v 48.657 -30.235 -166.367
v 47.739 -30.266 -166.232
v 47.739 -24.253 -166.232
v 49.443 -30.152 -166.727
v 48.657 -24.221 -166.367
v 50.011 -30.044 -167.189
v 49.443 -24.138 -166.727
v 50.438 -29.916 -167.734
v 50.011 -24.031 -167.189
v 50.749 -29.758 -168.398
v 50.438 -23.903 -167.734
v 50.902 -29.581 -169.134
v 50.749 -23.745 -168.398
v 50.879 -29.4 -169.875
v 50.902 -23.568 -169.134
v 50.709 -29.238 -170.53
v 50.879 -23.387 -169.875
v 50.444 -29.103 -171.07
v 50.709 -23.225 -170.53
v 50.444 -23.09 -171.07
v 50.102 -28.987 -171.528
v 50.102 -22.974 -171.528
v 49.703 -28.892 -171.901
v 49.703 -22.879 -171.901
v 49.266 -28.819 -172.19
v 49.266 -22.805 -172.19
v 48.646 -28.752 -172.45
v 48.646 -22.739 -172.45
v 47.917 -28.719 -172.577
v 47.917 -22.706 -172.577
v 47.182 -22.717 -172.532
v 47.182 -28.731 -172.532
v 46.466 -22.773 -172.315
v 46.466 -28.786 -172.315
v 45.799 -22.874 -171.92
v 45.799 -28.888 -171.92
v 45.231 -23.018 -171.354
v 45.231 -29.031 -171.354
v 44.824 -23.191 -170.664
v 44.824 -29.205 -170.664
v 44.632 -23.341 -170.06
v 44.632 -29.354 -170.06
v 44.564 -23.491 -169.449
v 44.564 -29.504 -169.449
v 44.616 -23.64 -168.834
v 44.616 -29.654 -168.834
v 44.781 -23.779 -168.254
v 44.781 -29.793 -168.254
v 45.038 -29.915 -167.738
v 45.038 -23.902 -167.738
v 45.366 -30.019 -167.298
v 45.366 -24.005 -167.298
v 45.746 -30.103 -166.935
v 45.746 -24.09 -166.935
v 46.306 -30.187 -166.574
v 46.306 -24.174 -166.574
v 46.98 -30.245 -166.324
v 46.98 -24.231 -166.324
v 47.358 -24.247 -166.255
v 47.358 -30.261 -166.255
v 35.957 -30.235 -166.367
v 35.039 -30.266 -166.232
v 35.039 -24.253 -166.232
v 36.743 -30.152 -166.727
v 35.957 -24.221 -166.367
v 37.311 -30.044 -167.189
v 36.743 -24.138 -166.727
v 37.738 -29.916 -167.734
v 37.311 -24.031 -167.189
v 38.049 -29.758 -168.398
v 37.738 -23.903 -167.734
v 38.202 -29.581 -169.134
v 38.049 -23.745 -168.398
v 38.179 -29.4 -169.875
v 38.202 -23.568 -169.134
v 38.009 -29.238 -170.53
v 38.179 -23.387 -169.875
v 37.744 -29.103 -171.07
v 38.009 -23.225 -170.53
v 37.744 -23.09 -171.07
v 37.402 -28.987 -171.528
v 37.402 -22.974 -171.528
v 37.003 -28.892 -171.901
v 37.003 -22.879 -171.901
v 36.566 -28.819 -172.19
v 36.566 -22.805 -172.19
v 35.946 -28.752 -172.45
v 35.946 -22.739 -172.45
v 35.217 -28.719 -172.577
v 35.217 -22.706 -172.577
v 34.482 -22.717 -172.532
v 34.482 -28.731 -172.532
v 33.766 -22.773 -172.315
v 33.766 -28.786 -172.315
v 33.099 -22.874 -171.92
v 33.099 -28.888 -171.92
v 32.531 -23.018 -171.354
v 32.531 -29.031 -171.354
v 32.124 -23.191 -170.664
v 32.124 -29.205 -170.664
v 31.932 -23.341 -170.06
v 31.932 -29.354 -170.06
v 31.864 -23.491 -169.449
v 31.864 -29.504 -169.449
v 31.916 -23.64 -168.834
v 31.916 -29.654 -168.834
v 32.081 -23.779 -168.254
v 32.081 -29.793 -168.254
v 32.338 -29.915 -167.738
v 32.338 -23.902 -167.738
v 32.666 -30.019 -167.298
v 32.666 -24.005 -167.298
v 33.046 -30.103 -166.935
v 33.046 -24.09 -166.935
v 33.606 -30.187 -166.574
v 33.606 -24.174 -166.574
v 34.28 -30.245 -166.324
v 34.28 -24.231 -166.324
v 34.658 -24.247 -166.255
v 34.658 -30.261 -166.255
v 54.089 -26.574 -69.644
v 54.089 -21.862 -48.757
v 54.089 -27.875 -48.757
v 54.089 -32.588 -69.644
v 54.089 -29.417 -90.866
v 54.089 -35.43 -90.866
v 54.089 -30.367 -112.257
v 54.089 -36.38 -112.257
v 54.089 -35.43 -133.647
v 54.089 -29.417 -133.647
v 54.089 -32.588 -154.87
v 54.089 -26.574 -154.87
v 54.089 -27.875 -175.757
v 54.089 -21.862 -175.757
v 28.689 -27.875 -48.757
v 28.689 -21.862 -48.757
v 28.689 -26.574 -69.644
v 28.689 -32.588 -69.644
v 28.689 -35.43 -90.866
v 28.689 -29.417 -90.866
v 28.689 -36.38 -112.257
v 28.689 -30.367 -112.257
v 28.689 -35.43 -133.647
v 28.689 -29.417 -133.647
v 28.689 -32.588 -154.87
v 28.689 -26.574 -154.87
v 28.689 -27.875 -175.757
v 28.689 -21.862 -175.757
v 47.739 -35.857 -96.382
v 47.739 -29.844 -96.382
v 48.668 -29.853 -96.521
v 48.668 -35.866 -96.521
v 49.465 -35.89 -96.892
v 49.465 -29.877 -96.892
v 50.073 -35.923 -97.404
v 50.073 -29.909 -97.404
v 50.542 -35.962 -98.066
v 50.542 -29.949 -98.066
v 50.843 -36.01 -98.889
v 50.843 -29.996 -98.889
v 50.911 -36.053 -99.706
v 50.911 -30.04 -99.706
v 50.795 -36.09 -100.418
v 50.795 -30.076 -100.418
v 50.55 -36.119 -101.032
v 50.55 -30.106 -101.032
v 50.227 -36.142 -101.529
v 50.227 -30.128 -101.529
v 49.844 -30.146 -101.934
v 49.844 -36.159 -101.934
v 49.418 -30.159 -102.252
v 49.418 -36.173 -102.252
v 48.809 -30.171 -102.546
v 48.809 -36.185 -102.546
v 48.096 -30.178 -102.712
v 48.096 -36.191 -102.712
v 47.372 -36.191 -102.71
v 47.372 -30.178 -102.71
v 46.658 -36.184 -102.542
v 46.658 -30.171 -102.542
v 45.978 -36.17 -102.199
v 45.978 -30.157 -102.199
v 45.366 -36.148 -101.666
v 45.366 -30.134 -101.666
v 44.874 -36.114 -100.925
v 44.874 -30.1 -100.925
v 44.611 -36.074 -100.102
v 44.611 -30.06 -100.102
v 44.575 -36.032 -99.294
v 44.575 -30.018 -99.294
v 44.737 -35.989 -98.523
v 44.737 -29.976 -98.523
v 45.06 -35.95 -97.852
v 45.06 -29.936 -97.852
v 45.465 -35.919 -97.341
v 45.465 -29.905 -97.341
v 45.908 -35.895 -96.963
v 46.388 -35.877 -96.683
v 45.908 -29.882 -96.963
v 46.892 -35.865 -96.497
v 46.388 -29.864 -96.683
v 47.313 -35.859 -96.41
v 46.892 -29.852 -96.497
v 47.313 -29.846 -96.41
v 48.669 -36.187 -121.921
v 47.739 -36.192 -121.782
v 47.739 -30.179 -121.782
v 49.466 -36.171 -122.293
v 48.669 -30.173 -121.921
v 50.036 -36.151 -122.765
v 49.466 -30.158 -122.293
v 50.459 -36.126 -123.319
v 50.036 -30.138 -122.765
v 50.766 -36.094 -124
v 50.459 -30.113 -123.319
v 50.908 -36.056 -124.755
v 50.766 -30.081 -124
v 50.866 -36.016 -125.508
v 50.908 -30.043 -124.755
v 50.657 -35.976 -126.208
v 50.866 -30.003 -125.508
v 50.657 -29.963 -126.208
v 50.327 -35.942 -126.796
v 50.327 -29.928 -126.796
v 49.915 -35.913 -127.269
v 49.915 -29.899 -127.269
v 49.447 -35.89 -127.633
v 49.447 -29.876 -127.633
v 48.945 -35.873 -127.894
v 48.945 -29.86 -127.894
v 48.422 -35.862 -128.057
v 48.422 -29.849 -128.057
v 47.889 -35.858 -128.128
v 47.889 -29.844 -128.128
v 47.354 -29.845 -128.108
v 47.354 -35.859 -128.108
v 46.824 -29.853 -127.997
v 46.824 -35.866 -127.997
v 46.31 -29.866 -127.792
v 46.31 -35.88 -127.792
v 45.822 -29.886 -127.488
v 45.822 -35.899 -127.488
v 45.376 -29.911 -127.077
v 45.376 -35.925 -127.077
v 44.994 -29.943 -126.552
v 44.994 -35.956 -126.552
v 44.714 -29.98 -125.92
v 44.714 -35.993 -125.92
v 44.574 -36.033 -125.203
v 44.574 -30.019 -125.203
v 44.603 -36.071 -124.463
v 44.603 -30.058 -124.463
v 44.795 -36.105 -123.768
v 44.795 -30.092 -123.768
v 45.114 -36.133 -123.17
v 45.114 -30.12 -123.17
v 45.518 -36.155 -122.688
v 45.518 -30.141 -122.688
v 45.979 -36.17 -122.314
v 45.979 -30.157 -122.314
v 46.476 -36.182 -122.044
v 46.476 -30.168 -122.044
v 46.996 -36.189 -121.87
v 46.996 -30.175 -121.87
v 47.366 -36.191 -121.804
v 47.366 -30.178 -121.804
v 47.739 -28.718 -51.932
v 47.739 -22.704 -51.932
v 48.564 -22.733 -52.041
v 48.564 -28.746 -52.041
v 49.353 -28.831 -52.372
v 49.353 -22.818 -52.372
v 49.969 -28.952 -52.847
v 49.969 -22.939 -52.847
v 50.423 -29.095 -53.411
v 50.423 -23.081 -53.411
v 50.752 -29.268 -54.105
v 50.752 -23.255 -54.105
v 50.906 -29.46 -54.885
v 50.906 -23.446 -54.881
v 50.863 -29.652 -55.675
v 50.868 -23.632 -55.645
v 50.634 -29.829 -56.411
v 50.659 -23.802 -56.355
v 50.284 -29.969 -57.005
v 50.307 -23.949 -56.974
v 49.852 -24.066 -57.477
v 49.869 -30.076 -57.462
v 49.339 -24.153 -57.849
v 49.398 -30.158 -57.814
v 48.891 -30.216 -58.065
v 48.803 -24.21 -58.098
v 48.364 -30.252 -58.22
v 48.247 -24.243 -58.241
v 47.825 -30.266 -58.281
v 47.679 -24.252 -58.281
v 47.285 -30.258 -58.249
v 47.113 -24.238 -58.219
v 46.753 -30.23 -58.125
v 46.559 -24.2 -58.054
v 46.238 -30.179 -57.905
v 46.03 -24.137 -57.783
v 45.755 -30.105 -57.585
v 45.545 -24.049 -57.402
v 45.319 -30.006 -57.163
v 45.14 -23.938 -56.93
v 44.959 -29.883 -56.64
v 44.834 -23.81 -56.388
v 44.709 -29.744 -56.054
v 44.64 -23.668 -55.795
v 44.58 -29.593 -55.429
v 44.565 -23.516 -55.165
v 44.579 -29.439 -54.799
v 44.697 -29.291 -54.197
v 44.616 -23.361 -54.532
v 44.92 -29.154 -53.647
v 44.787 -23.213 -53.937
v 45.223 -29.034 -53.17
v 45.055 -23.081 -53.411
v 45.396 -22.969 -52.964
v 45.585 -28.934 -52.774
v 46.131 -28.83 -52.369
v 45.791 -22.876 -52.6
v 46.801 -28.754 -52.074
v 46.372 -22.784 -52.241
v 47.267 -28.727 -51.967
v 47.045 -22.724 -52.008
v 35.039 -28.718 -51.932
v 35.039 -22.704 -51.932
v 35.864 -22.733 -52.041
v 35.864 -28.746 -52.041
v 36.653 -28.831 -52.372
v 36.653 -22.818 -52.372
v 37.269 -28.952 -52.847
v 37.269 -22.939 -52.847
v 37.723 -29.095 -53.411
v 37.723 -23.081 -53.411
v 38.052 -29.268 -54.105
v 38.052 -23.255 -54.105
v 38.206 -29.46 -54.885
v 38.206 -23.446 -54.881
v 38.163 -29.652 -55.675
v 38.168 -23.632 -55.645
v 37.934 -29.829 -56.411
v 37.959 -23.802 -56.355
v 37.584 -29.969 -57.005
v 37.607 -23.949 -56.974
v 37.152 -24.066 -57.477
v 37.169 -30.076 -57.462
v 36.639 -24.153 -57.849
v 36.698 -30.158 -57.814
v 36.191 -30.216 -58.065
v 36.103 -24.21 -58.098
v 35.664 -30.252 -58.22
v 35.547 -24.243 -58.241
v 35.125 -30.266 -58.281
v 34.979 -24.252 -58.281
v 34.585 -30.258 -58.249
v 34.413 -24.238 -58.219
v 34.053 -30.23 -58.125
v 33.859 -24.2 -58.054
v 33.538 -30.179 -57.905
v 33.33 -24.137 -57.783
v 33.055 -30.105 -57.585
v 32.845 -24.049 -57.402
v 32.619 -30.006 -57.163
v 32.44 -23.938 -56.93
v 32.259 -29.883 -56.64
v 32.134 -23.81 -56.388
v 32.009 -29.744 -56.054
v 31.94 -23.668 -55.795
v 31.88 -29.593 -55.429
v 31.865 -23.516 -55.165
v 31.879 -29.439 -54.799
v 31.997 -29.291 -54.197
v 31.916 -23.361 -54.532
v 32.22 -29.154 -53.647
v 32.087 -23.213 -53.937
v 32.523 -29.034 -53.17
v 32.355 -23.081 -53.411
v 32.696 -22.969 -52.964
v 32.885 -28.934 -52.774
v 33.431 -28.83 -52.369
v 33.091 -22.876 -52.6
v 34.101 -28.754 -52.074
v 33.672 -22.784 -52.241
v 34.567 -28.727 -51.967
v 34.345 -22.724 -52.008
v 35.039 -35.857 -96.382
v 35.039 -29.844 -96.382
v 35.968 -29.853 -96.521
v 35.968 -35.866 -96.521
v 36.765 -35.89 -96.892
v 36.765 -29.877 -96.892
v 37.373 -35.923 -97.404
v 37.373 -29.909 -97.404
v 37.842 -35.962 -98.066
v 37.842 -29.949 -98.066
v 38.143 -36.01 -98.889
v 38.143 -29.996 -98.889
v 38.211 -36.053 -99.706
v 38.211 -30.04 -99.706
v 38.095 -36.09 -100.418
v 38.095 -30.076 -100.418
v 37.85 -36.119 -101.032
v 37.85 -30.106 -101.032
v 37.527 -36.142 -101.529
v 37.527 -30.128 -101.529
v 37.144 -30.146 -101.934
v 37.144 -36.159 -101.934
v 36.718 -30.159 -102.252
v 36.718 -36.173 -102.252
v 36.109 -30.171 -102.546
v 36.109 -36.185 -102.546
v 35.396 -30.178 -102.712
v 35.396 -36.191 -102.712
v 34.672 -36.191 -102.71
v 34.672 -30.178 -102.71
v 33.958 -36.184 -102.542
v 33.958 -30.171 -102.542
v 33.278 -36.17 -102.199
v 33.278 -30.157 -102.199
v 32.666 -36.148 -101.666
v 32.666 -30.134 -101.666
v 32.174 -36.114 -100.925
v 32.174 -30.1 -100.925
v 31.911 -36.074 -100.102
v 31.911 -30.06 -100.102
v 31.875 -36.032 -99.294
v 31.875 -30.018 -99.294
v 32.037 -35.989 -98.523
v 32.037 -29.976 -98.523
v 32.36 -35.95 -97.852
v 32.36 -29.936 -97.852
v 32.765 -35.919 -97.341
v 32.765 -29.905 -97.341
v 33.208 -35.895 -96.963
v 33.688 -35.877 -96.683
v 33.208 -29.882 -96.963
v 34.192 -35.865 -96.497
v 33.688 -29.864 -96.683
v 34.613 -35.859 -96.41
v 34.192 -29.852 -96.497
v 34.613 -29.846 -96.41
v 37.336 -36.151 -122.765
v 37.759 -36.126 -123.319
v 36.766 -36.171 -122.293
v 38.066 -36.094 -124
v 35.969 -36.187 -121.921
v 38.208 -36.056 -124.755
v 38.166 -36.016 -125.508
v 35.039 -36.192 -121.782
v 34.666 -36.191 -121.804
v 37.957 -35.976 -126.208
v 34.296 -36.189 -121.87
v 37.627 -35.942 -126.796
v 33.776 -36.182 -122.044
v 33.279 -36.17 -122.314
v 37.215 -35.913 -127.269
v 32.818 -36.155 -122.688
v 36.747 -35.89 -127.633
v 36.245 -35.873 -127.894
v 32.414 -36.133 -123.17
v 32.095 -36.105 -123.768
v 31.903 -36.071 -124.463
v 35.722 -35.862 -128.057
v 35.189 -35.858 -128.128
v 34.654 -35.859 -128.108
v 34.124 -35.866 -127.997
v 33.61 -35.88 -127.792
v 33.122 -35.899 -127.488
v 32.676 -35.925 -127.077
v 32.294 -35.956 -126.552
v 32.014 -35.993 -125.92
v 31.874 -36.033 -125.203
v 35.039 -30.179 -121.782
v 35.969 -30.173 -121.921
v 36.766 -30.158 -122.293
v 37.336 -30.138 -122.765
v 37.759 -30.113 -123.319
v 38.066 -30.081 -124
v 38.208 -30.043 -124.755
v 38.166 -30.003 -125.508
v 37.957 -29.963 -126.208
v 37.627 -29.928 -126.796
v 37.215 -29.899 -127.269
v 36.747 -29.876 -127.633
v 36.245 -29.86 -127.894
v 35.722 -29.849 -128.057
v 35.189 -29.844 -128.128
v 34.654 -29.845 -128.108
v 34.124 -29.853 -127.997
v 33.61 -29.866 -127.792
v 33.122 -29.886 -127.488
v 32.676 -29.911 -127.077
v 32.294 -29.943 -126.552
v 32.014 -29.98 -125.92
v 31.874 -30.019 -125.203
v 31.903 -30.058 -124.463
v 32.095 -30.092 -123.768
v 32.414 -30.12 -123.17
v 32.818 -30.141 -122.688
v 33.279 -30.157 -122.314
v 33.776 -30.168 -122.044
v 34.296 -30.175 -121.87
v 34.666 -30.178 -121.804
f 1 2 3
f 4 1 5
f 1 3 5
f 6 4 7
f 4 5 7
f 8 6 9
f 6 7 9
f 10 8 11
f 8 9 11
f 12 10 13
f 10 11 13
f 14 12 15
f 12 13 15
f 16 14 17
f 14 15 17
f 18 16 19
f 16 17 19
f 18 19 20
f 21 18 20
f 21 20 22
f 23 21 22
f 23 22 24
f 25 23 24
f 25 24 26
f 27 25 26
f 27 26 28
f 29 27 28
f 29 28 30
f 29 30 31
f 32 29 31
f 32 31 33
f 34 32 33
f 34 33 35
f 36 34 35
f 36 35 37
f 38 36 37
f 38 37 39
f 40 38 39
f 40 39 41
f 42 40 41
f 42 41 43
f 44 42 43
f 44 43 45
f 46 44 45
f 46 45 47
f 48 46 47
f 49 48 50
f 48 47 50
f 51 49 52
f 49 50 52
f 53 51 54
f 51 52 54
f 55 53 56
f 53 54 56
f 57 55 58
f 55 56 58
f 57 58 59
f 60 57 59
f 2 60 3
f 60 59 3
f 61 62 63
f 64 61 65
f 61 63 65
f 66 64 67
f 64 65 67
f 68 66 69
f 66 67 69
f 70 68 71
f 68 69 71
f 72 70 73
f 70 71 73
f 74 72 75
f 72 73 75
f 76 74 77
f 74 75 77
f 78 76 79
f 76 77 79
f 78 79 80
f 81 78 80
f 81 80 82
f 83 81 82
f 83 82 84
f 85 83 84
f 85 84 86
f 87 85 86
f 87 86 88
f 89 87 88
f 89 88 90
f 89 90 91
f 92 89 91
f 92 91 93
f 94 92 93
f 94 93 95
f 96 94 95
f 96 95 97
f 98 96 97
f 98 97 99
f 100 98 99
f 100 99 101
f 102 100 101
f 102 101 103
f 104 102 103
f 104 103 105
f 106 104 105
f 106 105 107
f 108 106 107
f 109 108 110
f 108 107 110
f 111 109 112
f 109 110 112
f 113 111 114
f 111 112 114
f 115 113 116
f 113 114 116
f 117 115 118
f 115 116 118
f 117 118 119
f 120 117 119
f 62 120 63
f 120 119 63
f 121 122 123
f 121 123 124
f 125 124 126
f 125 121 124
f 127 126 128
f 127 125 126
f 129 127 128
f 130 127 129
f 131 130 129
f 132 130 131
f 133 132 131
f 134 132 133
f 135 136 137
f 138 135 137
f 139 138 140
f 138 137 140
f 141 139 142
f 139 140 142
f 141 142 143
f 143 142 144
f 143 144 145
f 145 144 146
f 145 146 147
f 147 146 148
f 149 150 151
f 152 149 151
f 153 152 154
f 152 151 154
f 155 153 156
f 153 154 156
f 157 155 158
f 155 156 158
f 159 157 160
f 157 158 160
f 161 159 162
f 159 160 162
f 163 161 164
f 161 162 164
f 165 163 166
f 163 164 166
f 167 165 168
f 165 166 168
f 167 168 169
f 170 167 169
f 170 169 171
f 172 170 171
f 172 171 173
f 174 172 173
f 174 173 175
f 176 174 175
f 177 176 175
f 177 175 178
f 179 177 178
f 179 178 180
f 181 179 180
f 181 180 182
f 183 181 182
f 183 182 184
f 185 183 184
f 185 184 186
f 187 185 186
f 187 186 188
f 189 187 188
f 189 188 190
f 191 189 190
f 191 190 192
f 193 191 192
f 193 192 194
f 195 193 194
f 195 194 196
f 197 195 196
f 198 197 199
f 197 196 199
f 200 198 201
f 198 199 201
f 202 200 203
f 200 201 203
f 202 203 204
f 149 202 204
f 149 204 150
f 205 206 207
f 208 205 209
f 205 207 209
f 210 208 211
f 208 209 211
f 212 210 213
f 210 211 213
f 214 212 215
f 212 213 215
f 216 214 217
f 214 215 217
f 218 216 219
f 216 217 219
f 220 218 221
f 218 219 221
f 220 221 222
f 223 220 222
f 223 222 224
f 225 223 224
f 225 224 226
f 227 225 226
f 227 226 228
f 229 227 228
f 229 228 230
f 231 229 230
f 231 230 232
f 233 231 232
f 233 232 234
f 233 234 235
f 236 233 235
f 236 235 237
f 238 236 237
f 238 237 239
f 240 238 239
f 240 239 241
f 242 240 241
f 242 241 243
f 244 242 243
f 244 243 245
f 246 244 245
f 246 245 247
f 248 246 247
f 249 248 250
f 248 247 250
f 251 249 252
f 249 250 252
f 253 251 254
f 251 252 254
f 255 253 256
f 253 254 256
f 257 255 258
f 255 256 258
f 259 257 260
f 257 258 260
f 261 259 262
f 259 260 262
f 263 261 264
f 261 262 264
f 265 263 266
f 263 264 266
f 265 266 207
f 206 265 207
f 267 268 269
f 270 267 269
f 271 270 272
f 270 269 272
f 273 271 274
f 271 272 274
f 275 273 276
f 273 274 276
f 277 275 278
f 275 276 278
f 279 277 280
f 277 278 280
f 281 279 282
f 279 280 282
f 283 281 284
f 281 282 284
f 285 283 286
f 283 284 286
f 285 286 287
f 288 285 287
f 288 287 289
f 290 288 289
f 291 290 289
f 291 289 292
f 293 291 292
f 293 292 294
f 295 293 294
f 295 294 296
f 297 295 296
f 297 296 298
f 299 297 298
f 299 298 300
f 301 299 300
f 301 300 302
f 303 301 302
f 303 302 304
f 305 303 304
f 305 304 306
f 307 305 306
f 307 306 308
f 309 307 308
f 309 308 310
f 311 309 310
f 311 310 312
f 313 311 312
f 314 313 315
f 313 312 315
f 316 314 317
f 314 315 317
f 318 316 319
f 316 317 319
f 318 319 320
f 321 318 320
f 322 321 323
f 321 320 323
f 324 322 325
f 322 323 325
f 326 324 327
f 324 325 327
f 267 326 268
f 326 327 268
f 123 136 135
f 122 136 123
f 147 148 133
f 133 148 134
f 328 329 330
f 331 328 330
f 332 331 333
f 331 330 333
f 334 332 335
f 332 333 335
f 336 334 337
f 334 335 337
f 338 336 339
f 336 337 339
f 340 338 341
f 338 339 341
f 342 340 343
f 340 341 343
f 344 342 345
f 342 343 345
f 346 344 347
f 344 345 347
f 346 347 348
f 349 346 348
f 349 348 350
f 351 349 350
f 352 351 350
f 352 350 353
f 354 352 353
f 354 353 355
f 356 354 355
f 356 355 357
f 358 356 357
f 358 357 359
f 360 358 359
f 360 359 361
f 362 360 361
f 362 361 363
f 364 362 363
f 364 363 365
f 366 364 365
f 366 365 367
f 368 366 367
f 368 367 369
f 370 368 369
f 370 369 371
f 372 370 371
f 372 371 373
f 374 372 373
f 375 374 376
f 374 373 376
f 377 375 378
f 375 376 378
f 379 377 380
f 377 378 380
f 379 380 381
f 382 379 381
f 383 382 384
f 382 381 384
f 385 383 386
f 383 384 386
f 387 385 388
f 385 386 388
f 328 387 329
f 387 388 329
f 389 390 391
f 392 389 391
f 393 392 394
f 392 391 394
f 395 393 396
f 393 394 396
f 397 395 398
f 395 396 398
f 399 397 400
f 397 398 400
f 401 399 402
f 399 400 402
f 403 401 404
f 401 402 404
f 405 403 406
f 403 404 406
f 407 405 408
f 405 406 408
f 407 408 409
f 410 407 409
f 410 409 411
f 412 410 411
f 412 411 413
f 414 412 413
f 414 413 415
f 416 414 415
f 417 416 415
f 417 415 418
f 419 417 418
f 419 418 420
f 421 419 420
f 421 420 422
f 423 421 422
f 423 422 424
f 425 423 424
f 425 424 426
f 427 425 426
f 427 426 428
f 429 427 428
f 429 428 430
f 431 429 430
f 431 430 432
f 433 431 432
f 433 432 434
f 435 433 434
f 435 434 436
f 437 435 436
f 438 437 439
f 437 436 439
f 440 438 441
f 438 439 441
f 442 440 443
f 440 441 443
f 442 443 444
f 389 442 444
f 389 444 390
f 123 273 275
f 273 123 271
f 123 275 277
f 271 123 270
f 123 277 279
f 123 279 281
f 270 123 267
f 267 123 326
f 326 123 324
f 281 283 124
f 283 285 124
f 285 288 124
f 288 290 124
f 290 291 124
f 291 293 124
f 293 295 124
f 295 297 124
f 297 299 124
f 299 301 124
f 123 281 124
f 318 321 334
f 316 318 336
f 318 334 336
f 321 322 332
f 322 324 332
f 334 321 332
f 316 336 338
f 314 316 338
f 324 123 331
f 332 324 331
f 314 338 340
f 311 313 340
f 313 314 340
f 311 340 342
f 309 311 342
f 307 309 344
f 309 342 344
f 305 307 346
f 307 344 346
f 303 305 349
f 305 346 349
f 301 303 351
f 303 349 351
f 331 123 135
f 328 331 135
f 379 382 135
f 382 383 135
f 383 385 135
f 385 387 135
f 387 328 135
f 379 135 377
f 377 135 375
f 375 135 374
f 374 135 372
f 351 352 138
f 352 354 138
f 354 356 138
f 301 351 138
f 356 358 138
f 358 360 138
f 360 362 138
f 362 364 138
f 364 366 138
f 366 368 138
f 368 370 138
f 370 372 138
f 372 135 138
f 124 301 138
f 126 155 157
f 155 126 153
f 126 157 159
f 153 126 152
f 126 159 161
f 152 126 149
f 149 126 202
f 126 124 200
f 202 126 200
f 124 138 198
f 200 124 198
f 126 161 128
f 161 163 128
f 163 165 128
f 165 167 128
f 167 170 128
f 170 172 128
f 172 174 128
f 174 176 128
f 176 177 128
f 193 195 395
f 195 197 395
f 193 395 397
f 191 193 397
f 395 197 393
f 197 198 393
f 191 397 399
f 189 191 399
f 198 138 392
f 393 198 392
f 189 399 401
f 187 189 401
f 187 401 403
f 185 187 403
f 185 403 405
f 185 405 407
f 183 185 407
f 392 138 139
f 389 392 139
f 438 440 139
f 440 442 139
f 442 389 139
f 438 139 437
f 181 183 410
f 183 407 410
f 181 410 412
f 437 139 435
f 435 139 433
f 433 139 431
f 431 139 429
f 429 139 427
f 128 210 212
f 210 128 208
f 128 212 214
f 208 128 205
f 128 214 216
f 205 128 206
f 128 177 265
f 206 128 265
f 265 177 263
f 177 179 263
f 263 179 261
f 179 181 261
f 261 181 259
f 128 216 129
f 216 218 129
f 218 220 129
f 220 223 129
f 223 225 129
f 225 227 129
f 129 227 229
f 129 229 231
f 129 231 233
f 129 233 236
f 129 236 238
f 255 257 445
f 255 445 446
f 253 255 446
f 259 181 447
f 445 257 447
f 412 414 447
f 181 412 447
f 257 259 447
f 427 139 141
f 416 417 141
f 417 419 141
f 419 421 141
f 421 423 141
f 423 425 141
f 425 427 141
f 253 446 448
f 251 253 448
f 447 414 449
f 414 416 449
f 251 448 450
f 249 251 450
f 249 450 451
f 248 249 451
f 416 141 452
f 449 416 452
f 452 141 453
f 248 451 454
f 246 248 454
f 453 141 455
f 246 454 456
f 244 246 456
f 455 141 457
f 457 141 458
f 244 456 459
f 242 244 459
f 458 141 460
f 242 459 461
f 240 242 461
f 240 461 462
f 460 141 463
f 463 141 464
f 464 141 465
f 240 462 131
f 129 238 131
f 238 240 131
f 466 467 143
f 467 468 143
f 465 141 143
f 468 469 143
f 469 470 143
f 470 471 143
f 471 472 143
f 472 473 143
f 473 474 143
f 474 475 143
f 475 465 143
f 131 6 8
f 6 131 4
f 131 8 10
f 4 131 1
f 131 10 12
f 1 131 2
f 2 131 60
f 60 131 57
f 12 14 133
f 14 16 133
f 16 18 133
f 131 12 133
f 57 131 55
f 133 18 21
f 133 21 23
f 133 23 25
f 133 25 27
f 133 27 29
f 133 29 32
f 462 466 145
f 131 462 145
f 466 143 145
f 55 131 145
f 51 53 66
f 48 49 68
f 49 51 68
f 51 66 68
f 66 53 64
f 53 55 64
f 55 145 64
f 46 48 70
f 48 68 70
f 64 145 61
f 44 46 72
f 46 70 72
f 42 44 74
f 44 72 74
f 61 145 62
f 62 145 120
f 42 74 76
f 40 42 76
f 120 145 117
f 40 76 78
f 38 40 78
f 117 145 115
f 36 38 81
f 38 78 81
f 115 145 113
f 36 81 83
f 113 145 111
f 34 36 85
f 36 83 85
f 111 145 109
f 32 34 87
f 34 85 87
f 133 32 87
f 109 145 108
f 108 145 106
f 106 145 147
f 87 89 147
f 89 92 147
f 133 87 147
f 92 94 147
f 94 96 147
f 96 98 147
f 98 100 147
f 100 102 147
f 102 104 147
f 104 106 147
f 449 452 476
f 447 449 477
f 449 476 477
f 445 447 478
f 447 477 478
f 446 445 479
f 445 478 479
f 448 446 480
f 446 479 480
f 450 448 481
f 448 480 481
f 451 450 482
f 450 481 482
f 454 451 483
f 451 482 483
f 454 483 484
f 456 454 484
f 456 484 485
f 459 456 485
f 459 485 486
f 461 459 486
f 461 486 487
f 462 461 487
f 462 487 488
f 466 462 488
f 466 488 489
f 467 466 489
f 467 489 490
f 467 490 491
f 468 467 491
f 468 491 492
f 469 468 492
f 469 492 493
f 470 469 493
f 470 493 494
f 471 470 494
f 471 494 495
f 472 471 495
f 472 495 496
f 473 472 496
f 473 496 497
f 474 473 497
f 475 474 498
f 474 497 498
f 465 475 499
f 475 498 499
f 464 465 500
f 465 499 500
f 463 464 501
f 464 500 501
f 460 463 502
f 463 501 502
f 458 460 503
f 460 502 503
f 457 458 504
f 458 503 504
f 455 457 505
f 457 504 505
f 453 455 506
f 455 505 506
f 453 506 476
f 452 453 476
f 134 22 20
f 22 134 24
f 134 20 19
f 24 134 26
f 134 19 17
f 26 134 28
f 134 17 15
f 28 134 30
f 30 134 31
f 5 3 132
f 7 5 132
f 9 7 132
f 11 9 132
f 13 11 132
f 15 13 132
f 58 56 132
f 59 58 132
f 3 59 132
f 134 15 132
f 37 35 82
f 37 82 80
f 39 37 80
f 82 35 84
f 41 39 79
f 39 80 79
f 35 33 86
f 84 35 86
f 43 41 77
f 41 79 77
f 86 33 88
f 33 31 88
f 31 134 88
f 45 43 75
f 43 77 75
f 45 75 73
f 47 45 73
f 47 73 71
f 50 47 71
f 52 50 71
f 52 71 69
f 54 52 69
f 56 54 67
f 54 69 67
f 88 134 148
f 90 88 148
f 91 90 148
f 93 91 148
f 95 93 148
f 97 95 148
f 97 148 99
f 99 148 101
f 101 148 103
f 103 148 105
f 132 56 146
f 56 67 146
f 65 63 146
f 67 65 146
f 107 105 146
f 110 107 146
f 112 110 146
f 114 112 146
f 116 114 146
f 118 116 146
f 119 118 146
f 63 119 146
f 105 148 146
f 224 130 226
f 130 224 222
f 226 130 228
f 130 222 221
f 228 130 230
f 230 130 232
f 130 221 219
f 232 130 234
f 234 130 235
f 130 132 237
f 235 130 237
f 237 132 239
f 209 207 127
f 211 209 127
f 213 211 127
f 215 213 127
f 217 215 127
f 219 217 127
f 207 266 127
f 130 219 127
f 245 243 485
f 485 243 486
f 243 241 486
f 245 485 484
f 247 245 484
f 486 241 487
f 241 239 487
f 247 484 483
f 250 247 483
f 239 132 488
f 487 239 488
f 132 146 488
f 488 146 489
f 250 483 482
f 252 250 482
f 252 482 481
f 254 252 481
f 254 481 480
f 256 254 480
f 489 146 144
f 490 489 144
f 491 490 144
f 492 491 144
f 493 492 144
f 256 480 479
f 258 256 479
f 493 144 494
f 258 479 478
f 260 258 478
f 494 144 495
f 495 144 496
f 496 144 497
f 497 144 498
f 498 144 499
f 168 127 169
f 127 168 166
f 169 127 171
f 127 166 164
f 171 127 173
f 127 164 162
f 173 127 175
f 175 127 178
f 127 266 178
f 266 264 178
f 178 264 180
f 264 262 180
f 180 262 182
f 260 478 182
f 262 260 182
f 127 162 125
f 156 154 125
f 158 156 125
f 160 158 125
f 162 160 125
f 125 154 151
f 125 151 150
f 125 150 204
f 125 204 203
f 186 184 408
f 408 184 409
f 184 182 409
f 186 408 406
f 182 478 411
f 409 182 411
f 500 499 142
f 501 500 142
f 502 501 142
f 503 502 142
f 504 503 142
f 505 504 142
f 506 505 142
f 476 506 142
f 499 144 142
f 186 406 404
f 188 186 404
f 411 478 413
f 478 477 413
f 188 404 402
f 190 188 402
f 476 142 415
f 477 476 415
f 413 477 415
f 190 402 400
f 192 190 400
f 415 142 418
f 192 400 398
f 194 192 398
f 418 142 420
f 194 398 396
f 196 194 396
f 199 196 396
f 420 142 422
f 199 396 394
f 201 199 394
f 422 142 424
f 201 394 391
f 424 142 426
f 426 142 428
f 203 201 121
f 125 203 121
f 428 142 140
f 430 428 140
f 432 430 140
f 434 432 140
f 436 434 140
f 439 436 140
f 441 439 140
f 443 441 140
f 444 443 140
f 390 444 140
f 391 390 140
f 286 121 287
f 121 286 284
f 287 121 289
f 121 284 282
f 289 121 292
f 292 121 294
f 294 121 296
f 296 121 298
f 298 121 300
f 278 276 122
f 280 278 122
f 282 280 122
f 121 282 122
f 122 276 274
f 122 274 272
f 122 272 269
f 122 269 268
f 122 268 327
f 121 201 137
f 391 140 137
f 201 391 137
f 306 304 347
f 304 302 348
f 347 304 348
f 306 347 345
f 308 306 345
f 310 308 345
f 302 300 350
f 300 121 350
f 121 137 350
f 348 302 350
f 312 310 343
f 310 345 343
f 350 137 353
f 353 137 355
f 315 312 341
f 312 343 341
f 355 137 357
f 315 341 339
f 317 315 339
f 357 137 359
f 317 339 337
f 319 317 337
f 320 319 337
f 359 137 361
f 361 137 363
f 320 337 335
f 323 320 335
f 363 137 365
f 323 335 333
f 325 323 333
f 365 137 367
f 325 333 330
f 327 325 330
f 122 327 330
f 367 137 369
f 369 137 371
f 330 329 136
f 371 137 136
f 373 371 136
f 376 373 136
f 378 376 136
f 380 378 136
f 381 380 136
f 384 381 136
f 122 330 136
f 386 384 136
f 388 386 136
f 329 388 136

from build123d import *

# Parameters (mm, degrees)
BOSS_EXTRUDE4_DEPTH = 304.8
SKETCH4_OUTSIDE_W   = 384.928
SKETCH4_OUTSIDE_H   = 321.428
SKETCH4_OUTSIDE_W_2 = 25.4
SKETCH4_OUTSIDE_H_2 = 127
CUT_EXTRUDE2_DEPTH  = 150
SKETCH6_R           = 3.175
CUT_EXTRUDE4_DEPTH  = 150
SKETCH5_R           = 3.175
CUT_EXTRUDE5_DEPTH  = 150


with BuildPart() as part:
    # Sketch3 → Boss-Extrude4 (new body)
    with BuildSketch(Plane(origin=(0, 0, 0), x_dir=(0, 0, -1), z_dir=(1, 0, 0))):
        with BuildLine():
            ThreePointArc((232.90669496, 1.961354585), (112.25669496, -30.366715482), (-8.39330504, 1.961354585))
            Line((-8.39330504, 1.961354585), (-8.39330504, -4.052041589))
            ThreePointArc((-8.39330504, -4.052041589), (112.25669496, -36.380111656), (232.90669496, -4.052041589))
            Line((232.90669496, -4.052041589), (232.90669496, 1.961354585))
        make_face()
    extrude(amount=BOSS_EXTRUDE4_DEPTH)

    # Sketch4 outside → Cut-Extrude2 (cut)
    with BuildSketch(Plane(origin=(0, 1.961354585, 0), x_dir=(1, 0, 0), z_dir=(0, 1, 0))):
        with Locations((152.4, 112.257)):
            Rectangle(SKETCH4_OUTSIDE_W, SKETCH4_OUTSIDE_H)
        with Locations((41.389045768, 112.25669496)):
            Rectangle(SKETCH4_OUTSIDE_W_2, SKETCH4_OUTSIDE_H_2, mode=Mode.SUBTRACT)
    extrude(amount=-CUT_EXTRUDE2_DEPTH, mode=Mode.SUBTRACT)

    # Sketch6 → Cut-Extrude4 (cut)
    with BuildSketch(Plane(origin=(0, 1.961354585, 0), x_dir=(1, 0, 0), z_dir=(0, 1, 0))):
        with Locations(Location((35.039045768, 124.95669496, 0), (0, 0, 270))):
            Circle(SKETCH6_R)
        with Locations(Location((47.739045768, 124.95669496, 0), (0, 0, 270))):
            Circle(SKETCH6_R)
        with Locations(Location((35.039045768, 99.55669496, 0), (0, 0, 270))):
            Circle(SKETCH6_R)
        with Locations(Location((47.739045768, 99.55669496, 0), (0, 0, 270))):
            Circle(SKETCH6_R)
    extrude(amount=-CUT_EXTRUDE4_DEPTH, mode=Mode.SUBTRACT)

    # Sketch5 → Cut-Extrude5 (cut)
    with BuildSketch(Plane(origin=(0, 1.961354585, 0), x_dir=(1, 0, 0), z_dir=(0, 1, 0))):
        with Locations(Location((47.739045768, 169.40669496, 0), (0, 0, 270))):
            Circle(SKETCH5_R)
        with Locations(Location((35.039045768, 169.40669496, 0), (0, 0, 270))):
            Circle(SKETCH5_R)
        with Locations(Location((35.039045768, 55.10669496, 0), (0, 0, 270))):
            Circle(SKETCH5_R)
        with Locations(Location((47.739045768, 55.10669496, 0), (0, 0, 270))):
            Circle(SKETCH5_R)
    extrude(amount=-CUT_EXTRUDE5_DEPTH, mode=Mode.SUBTRACT)


solid = part.part
